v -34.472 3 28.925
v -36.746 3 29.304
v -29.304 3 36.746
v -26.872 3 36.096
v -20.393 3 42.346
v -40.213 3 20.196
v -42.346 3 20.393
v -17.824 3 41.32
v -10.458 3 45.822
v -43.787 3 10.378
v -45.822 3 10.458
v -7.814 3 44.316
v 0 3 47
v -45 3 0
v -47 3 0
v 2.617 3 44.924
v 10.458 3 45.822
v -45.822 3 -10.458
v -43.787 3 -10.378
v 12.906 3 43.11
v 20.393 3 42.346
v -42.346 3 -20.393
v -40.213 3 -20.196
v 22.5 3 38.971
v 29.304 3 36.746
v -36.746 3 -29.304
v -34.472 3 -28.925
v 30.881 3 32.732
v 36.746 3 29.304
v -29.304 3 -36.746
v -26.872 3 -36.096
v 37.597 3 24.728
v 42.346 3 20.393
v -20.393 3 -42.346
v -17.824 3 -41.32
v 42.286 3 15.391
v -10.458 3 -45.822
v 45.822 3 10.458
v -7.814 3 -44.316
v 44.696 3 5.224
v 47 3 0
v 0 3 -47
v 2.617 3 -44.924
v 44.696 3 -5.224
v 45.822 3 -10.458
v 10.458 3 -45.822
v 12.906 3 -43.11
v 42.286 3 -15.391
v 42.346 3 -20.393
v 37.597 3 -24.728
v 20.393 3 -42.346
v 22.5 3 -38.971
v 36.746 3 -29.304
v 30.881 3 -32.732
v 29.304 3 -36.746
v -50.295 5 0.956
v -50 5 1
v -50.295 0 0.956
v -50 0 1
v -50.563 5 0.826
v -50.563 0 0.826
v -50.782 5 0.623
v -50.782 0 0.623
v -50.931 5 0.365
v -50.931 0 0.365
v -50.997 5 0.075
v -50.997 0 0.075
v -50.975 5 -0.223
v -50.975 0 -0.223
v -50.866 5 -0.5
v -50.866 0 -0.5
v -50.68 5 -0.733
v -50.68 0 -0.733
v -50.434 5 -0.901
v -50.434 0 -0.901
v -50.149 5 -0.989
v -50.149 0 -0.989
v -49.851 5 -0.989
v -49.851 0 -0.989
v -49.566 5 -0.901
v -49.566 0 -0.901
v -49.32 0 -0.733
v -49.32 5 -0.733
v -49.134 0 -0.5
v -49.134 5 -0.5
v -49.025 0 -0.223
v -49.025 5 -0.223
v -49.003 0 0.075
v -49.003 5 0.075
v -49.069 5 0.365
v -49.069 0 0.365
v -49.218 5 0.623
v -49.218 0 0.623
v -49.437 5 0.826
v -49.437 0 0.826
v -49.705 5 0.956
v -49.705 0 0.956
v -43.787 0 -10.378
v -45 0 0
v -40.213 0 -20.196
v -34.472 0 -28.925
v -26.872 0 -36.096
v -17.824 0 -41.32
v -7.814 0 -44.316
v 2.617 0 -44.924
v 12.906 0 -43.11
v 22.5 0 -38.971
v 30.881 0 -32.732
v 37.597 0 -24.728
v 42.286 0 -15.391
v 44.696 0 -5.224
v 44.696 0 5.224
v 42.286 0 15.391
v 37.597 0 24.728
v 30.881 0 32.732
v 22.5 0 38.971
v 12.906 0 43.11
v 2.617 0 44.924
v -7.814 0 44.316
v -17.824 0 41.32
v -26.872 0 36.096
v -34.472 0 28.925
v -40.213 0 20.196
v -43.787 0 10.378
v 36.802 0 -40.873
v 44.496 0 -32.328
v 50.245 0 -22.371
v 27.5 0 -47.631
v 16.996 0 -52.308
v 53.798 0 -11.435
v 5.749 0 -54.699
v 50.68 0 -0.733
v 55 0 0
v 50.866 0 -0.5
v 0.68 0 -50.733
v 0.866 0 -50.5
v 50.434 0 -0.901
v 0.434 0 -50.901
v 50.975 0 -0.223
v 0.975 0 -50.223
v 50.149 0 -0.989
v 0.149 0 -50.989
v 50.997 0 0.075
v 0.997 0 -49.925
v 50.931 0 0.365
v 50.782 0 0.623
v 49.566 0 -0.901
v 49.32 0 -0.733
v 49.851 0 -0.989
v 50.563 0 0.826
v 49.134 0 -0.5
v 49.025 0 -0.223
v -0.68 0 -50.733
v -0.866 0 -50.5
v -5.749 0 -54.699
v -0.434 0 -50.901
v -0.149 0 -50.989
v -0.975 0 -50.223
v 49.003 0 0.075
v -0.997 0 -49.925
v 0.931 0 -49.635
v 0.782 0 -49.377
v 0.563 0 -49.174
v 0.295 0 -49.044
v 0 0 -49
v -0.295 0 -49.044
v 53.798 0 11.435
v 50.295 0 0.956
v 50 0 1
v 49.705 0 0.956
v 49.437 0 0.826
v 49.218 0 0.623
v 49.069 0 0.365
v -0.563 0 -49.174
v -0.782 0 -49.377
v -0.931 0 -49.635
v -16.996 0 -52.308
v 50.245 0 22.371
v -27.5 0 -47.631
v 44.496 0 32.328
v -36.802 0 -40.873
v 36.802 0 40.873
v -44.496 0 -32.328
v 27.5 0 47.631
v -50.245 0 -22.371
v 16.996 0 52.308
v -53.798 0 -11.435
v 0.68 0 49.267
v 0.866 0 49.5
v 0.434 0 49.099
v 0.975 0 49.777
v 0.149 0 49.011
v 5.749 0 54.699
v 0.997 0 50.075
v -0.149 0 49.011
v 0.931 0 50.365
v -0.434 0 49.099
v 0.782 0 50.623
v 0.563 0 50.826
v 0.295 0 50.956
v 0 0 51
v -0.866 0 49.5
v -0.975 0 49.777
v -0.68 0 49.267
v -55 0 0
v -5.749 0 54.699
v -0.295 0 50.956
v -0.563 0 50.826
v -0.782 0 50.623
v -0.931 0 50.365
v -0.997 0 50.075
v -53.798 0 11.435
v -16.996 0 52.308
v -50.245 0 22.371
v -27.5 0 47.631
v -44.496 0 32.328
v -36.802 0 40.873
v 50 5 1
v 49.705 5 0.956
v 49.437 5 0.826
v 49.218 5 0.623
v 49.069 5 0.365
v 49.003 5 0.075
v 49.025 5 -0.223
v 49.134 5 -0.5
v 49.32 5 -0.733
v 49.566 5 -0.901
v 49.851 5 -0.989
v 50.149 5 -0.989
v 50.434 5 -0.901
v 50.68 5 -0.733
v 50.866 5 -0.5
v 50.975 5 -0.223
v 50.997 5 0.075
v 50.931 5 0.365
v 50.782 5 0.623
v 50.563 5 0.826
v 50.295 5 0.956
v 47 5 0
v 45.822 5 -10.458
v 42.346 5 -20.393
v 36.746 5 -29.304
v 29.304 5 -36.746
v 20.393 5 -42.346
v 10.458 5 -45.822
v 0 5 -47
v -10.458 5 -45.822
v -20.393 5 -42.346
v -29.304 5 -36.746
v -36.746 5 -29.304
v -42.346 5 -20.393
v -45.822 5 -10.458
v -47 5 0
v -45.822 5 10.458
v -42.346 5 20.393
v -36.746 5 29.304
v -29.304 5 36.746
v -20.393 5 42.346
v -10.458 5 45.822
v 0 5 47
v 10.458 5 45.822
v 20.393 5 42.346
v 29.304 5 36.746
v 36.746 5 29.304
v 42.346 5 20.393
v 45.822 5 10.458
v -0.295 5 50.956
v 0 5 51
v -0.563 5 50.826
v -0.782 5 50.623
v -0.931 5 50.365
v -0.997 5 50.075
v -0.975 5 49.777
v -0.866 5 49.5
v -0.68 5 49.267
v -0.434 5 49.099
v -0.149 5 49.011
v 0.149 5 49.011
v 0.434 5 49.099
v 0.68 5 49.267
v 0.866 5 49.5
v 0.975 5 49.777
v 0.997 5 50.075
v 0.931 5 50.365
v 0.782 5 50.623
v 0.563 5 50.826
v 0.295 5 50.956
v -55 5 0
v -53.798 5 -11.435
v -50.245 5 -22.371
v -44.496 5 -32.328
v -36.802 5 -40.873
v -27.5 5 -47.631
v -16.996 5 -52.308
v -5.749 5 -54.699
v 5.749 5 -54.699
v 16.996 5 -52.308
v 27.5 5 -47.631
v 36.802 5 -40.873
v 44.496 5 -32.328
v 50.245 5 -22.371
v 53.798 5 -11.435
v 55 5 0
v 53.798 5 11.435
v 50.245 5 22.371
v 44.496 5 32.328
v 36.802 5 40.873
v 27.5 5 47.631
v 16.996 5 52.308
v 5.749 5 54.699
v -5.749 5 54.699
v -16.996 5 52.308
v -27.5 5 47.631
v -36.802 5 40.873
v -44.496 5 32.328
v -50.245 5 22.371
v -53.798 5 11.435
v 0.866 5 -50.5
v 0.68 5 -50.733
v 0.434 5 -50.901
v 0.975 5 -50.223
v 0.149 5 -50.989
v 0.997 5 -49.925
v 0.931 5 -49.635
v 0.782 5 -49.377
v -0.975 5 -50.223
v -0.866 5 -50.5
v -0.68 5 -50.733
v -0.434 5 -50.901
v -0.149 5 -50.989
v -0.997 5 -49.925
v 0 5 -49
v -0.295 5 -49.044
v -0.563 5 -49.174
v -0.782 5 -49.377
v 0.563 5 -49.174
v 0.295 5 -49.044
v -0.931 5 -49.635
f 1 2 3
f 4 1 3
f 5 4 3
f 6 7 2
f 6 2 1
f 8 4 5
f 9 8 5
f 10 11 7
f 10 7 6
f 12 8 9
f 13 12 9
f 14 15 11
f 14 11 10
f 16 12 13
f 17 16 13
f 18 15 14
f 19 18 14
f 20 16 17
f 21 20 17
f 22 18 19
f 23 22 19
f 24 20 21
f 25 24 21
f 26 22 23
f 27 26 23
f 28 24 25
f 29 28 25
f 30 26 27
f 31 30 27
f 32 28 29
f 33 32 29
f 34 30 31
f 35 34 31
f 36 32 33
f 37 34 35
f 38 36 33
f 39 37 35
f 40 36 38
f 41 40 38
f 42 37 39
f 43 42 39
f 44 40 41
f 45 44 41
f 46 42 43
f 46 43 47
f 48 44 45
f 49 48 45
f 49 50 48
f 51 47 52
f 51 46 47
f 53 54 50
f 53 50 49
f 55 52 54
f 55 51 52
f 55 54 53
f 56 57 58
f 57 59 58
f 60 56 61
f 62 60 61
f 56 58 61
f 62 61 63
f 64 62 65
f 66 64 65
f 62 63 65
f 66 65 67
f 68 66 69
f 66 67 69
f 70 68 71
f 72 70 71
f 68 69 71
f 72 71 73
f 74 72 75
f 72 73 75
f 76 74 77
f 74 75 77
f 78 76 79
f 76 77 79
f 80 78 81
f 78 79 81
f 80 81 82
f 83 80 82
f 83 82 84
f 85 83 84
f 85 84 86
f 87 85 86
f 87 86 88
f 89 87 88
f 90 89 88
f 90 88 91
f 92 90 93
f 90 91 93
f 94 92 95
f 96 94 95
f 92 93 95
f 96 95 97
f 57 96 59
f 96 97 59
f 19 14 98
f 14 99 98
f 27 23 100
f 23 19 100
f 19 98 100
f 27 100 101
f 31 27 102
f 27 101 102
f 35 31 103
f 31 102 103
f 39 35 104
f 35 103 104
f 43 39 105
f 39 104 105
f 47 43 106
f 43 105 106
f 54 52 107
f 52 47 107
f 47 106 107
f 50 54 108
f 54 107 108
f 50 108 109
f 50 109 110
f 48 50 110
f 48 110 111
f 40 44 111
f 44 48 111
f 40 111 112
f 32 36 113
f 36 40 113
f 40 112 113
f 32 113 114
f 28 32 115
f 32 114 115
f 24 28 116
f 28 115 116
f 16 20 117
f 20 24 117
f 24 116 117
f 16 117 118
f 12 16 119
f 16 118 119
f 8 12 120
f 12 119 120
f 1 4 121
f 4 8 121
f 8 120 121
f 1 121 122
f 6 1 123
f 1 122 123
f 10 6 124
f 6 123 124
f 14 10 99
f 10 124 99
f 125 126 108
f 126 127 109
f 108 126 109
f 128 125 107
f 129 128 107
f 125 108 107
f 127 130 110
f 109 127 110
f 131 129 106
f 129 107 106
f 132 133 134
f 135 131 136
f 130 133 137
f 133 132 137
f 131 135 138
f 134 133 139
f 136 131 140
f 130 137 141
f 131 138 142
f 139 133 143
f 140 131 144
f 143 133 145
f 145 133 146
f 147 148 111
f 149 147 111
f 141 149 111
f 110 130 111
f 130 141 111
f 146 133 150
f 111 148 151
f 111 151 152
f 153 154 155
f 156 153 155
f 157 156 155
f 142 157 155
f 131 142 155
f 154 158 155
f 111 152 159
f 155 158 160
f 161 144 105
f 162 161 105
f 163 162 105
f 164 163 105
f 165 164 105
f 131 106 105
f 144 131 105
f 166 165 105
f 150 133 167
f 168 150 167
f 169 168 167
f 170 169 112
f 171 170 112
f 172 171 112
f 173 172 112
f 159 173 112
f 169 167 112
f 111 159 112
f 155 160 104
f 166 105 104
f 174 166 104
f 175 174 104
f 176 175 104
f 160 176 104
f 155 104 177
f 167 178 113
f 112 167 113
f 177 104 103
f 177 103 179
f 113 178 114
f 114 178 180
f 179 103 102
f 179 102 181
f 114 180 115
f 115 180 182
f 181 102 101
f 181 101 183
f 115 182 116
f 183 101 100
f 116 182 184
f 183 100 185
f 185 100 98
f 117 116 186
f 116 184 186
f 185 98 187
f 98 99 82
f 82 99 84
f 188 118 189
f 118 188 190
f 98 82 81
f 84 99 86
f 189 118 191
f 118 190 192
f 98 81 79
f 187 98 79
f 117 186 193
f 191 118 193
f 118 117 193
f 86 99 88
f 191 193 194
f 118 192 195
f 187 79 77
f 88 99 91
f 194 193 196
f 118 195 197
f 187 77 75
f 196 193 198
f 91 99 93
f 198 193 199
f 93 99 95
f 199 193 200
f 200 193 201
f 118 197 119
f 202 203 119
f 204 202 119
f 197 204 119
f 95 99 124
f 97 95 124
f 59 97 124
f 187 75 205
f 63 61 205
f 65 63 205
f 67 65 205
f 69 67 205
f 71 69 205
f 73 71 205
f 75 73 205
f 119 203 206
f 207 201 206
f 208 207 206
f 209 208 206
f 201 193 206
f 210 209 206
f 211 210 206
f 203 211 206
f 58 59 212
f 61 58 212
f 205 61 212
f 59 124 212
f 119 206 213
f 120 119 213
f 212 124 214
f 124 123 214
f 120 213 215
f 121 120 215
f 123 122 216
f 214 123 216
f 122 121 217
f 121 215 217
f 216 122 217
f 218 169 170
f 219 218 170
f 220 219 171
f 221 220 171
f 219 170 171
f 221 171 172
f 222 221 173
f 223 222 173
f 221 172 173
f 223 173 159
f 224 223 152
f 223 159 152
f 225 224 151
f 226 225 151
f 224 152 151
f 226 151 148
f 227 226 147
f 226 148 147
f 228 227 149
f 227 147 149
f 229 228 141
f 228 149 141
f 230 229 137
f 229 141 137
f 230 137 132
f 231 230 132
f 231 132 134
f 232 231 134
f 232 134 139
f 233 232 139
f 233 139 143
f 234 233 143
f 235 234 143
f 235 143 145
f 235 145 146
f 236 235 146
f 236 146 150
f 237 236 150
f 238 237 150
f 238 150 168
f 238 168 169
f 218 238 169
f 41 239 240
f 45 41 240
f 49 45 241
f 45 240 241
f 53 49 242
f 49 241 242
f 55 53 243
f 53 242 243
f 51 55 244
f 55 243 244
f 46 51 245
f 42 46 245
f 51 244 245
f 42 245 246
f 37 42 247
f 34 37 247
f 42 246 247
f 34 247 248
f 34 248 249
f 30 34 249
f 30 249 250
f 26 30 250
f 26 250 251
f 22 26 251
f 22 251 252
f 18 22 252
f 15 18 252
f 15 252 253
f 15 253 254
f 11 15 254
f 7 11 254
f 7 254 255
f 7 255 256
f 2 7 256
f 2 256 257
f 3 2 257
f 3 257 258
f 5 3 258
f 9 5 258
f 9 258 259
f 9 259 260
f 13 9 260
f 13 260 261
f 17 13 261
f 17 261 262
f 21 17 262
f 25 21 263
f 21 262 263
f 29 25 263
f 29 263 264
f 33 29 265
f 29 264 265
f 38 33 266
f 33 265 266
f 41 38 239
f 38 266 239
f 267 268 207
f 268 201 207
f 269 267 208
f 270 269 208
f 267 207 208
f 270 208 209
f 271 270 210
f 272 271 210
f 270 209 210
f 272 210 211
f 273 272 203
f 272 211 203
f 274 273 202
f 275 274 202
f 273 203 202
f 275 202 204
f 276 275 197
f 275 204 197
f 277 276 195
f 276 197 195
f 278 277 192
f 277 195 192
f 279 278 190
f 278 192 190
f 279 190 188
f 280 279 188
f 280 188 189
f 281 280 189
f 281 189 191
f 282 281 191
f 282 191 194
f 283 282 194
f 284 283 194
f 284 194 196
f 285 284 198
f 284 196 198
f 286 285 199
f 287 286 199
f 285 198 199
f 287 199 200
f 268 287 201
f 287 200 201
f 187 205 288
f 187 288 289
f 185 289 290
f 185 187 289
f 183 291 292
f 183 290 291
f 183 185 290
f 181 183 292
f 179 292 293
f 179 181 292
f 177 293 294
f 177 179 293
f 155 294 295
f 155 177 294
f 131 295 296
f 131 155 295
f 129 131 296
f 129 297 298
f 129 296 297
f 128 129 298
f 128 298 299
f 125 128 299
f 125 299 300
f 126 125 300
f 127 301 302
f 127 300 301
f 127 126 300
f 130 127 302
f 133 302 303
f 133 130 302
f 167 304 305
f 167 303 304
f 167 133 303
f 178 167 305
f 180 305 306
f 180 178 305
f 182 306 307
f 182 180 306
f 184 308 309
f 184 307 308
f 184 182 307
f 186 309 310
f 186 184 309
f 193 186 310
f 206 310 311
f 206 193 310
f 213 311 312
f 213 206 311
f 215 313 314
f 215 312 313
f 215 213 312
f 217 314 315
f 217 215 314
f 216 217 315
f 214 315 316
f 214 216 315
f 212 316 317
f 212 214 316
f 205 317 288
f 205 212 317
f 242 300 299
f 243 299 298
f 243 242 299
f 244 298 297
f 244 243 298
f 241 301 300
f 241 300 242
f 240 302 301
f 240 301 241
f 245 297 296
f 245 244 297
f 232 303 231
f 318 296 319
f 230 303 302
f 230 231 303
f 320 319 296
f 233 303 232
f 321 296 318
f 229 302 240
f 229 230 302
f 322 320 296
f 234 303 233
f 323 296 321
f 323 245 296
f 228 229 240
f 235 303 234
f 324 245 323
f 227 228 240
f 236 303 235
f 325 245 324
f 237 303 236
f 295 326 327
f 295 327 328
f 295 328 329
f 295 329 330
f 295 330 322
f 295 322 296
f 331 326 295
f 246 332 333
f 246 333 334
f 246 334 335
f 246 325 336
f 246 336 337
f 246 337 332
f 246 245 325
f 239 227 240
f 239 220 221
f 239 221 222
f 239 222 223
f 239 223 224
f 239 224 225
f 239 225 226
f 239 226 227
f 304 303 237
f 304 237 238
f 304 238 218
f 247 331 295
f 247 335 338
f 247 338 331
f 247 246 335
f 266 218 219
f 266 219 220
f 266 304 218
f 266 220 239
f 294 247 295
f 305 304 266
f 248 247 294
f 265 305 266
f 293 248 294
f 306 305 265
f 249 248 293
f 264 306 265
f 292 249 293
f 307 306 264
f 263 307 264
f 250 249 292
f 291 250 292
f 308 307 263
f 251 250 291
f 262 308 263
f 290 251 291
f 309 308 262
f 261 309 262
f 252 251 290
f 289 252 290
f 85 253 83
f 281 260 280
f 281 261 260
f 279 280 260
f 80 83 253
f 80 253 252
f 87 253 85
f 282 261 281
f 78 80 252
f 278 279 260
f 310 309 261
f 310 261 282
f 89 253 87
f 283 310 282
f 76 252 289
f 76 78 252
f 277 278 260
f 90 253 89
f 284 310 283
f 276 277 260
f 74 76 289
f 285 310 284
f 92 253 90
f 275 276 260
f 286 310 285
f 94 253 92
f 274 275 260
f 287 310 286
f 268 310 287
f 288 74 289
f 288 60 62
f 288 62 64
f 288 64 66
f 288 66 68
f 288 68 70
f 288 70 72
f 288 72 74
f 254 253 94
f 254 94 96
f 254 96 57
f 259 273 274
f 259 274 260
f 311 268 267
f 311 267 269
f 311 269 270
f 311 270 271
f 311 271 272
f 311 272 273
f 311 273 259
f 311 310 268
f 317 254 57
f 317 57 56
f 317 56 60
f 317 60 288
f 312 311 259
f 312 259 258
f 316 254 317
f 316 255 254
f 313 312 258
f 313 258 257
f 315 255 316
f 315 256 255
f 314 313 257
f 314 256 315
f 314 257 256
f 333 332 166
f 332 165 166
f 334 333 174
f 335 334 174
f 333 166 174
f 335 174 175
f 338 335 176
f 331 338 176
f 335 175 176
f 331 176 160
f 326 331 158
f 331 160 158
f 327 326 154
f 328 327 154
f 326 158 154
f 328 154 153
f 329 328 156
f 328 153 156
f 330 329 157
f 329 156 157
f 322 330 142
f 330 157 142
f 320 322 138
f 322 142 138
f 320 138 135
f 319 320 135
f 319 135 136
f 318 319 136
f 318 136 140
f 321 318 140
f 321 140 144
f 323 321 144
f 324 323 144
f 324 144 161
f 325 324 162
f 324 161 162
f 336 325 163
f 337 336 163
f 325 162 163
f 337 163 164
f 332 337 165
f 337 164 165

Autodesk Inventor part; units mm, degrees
ref_plane "YZ Plane" through (0, 0, 0) normal (1, 0, 0) x (0, 1, 0)
ref_plane "XZ Plane" through (0, 0, 0) normal (0, 1, 0) x (-1, 0, 0)
ref_plane "XY Plane" through (0, 0, 0) normal (0, 0, 1) x (1, 0, 0)
sketch "Sketch1" plane through (0, 0, 0) normal (0, 1, 0) x (-1, 0, 0)
  circle A0 centre (0, 0) radius 45
  circle A1 centre (0, 0) radius 55
  dimension "d0" = 90
  dimension "d1" = 110
extrude "Extrusion1" add sketch "Sketch1" along normal blind 5
sketch "Sketch2" plane through (0, 5, 0) normal (0, 1, 0) x (1, 0, 0)
  circle A0 centre (0, 0) radius 45
  circle A1 centre (0, 0) radius 47
  dimension "d4" = 90
  dimension "d5" = 94
extrude "Extrusion2" cut sketch "Sketch2" against normal blind 2
sketch "Sketch3" plane through (0, 5, 0) normal (0, 1, 0) x (1, 0, 0)
  circle A0 centre (0, -50) radius 1
  circle A1 centre (0, 0) radius 55 projected
  dimension "d8" = 2
  dimension "d9" = 50
hole "Hole1" at (0, 5, 50) direction (0, -1, 0) diameter 2 end through all
sketch "Sketch4" plane through (0, 5, 0) normal (0, 1, 0) x (1, 0, 0)
  circle A0 centre (-50, 0) radius 1
  point P0 (0, 0)
  dimension "d17" = 2
  dimension "d18" = 50
sketch "Sketch5" plane through (0, 5, 0) normal (0, 1, 0) x (1, 0, 0)
  circle A0 centre (0, 50) radius 1
  point P0 (0, 0)
  dimension "d19" = 2
  dimension "d20" = 50
sketch "Sketch6" plane through (0, 5, 0) normal (0, 1, 0) x (1, 0, 0)
  circle A0 centre (50, 0) radius 1
  point P0 (0, 0)
  dimension "d21" = 2
  dimension "d22" = 50
hole "Hole2" at (-50, 5, 0) direction (0, -1, 0) diameter 2 end through all
hole "Hole3" at (0, 5, -50) direction (0, -1, 0) diameter 2 end through all
hole "Hole4" at (50, 5, 0) direction (0, -1, 0) diameter 2 end through all
thread "Thread1" size "2-56 UNC" class "2B" standard "ANSI Unified Screw Threads" full length
thread "Thread2" size "2-56 UNC" class "2B" standard "ANSI Unified Screw Threads" full length
thread "Thread3" size "2-56 UNC" class "2B" standard "ANSI Unified Screw Threads" full length
thread "Thread4" size "2-56 UNC" class "2B" standard "ANSI Unified Screw Threads" full length
properties part number "Mirror Support"
